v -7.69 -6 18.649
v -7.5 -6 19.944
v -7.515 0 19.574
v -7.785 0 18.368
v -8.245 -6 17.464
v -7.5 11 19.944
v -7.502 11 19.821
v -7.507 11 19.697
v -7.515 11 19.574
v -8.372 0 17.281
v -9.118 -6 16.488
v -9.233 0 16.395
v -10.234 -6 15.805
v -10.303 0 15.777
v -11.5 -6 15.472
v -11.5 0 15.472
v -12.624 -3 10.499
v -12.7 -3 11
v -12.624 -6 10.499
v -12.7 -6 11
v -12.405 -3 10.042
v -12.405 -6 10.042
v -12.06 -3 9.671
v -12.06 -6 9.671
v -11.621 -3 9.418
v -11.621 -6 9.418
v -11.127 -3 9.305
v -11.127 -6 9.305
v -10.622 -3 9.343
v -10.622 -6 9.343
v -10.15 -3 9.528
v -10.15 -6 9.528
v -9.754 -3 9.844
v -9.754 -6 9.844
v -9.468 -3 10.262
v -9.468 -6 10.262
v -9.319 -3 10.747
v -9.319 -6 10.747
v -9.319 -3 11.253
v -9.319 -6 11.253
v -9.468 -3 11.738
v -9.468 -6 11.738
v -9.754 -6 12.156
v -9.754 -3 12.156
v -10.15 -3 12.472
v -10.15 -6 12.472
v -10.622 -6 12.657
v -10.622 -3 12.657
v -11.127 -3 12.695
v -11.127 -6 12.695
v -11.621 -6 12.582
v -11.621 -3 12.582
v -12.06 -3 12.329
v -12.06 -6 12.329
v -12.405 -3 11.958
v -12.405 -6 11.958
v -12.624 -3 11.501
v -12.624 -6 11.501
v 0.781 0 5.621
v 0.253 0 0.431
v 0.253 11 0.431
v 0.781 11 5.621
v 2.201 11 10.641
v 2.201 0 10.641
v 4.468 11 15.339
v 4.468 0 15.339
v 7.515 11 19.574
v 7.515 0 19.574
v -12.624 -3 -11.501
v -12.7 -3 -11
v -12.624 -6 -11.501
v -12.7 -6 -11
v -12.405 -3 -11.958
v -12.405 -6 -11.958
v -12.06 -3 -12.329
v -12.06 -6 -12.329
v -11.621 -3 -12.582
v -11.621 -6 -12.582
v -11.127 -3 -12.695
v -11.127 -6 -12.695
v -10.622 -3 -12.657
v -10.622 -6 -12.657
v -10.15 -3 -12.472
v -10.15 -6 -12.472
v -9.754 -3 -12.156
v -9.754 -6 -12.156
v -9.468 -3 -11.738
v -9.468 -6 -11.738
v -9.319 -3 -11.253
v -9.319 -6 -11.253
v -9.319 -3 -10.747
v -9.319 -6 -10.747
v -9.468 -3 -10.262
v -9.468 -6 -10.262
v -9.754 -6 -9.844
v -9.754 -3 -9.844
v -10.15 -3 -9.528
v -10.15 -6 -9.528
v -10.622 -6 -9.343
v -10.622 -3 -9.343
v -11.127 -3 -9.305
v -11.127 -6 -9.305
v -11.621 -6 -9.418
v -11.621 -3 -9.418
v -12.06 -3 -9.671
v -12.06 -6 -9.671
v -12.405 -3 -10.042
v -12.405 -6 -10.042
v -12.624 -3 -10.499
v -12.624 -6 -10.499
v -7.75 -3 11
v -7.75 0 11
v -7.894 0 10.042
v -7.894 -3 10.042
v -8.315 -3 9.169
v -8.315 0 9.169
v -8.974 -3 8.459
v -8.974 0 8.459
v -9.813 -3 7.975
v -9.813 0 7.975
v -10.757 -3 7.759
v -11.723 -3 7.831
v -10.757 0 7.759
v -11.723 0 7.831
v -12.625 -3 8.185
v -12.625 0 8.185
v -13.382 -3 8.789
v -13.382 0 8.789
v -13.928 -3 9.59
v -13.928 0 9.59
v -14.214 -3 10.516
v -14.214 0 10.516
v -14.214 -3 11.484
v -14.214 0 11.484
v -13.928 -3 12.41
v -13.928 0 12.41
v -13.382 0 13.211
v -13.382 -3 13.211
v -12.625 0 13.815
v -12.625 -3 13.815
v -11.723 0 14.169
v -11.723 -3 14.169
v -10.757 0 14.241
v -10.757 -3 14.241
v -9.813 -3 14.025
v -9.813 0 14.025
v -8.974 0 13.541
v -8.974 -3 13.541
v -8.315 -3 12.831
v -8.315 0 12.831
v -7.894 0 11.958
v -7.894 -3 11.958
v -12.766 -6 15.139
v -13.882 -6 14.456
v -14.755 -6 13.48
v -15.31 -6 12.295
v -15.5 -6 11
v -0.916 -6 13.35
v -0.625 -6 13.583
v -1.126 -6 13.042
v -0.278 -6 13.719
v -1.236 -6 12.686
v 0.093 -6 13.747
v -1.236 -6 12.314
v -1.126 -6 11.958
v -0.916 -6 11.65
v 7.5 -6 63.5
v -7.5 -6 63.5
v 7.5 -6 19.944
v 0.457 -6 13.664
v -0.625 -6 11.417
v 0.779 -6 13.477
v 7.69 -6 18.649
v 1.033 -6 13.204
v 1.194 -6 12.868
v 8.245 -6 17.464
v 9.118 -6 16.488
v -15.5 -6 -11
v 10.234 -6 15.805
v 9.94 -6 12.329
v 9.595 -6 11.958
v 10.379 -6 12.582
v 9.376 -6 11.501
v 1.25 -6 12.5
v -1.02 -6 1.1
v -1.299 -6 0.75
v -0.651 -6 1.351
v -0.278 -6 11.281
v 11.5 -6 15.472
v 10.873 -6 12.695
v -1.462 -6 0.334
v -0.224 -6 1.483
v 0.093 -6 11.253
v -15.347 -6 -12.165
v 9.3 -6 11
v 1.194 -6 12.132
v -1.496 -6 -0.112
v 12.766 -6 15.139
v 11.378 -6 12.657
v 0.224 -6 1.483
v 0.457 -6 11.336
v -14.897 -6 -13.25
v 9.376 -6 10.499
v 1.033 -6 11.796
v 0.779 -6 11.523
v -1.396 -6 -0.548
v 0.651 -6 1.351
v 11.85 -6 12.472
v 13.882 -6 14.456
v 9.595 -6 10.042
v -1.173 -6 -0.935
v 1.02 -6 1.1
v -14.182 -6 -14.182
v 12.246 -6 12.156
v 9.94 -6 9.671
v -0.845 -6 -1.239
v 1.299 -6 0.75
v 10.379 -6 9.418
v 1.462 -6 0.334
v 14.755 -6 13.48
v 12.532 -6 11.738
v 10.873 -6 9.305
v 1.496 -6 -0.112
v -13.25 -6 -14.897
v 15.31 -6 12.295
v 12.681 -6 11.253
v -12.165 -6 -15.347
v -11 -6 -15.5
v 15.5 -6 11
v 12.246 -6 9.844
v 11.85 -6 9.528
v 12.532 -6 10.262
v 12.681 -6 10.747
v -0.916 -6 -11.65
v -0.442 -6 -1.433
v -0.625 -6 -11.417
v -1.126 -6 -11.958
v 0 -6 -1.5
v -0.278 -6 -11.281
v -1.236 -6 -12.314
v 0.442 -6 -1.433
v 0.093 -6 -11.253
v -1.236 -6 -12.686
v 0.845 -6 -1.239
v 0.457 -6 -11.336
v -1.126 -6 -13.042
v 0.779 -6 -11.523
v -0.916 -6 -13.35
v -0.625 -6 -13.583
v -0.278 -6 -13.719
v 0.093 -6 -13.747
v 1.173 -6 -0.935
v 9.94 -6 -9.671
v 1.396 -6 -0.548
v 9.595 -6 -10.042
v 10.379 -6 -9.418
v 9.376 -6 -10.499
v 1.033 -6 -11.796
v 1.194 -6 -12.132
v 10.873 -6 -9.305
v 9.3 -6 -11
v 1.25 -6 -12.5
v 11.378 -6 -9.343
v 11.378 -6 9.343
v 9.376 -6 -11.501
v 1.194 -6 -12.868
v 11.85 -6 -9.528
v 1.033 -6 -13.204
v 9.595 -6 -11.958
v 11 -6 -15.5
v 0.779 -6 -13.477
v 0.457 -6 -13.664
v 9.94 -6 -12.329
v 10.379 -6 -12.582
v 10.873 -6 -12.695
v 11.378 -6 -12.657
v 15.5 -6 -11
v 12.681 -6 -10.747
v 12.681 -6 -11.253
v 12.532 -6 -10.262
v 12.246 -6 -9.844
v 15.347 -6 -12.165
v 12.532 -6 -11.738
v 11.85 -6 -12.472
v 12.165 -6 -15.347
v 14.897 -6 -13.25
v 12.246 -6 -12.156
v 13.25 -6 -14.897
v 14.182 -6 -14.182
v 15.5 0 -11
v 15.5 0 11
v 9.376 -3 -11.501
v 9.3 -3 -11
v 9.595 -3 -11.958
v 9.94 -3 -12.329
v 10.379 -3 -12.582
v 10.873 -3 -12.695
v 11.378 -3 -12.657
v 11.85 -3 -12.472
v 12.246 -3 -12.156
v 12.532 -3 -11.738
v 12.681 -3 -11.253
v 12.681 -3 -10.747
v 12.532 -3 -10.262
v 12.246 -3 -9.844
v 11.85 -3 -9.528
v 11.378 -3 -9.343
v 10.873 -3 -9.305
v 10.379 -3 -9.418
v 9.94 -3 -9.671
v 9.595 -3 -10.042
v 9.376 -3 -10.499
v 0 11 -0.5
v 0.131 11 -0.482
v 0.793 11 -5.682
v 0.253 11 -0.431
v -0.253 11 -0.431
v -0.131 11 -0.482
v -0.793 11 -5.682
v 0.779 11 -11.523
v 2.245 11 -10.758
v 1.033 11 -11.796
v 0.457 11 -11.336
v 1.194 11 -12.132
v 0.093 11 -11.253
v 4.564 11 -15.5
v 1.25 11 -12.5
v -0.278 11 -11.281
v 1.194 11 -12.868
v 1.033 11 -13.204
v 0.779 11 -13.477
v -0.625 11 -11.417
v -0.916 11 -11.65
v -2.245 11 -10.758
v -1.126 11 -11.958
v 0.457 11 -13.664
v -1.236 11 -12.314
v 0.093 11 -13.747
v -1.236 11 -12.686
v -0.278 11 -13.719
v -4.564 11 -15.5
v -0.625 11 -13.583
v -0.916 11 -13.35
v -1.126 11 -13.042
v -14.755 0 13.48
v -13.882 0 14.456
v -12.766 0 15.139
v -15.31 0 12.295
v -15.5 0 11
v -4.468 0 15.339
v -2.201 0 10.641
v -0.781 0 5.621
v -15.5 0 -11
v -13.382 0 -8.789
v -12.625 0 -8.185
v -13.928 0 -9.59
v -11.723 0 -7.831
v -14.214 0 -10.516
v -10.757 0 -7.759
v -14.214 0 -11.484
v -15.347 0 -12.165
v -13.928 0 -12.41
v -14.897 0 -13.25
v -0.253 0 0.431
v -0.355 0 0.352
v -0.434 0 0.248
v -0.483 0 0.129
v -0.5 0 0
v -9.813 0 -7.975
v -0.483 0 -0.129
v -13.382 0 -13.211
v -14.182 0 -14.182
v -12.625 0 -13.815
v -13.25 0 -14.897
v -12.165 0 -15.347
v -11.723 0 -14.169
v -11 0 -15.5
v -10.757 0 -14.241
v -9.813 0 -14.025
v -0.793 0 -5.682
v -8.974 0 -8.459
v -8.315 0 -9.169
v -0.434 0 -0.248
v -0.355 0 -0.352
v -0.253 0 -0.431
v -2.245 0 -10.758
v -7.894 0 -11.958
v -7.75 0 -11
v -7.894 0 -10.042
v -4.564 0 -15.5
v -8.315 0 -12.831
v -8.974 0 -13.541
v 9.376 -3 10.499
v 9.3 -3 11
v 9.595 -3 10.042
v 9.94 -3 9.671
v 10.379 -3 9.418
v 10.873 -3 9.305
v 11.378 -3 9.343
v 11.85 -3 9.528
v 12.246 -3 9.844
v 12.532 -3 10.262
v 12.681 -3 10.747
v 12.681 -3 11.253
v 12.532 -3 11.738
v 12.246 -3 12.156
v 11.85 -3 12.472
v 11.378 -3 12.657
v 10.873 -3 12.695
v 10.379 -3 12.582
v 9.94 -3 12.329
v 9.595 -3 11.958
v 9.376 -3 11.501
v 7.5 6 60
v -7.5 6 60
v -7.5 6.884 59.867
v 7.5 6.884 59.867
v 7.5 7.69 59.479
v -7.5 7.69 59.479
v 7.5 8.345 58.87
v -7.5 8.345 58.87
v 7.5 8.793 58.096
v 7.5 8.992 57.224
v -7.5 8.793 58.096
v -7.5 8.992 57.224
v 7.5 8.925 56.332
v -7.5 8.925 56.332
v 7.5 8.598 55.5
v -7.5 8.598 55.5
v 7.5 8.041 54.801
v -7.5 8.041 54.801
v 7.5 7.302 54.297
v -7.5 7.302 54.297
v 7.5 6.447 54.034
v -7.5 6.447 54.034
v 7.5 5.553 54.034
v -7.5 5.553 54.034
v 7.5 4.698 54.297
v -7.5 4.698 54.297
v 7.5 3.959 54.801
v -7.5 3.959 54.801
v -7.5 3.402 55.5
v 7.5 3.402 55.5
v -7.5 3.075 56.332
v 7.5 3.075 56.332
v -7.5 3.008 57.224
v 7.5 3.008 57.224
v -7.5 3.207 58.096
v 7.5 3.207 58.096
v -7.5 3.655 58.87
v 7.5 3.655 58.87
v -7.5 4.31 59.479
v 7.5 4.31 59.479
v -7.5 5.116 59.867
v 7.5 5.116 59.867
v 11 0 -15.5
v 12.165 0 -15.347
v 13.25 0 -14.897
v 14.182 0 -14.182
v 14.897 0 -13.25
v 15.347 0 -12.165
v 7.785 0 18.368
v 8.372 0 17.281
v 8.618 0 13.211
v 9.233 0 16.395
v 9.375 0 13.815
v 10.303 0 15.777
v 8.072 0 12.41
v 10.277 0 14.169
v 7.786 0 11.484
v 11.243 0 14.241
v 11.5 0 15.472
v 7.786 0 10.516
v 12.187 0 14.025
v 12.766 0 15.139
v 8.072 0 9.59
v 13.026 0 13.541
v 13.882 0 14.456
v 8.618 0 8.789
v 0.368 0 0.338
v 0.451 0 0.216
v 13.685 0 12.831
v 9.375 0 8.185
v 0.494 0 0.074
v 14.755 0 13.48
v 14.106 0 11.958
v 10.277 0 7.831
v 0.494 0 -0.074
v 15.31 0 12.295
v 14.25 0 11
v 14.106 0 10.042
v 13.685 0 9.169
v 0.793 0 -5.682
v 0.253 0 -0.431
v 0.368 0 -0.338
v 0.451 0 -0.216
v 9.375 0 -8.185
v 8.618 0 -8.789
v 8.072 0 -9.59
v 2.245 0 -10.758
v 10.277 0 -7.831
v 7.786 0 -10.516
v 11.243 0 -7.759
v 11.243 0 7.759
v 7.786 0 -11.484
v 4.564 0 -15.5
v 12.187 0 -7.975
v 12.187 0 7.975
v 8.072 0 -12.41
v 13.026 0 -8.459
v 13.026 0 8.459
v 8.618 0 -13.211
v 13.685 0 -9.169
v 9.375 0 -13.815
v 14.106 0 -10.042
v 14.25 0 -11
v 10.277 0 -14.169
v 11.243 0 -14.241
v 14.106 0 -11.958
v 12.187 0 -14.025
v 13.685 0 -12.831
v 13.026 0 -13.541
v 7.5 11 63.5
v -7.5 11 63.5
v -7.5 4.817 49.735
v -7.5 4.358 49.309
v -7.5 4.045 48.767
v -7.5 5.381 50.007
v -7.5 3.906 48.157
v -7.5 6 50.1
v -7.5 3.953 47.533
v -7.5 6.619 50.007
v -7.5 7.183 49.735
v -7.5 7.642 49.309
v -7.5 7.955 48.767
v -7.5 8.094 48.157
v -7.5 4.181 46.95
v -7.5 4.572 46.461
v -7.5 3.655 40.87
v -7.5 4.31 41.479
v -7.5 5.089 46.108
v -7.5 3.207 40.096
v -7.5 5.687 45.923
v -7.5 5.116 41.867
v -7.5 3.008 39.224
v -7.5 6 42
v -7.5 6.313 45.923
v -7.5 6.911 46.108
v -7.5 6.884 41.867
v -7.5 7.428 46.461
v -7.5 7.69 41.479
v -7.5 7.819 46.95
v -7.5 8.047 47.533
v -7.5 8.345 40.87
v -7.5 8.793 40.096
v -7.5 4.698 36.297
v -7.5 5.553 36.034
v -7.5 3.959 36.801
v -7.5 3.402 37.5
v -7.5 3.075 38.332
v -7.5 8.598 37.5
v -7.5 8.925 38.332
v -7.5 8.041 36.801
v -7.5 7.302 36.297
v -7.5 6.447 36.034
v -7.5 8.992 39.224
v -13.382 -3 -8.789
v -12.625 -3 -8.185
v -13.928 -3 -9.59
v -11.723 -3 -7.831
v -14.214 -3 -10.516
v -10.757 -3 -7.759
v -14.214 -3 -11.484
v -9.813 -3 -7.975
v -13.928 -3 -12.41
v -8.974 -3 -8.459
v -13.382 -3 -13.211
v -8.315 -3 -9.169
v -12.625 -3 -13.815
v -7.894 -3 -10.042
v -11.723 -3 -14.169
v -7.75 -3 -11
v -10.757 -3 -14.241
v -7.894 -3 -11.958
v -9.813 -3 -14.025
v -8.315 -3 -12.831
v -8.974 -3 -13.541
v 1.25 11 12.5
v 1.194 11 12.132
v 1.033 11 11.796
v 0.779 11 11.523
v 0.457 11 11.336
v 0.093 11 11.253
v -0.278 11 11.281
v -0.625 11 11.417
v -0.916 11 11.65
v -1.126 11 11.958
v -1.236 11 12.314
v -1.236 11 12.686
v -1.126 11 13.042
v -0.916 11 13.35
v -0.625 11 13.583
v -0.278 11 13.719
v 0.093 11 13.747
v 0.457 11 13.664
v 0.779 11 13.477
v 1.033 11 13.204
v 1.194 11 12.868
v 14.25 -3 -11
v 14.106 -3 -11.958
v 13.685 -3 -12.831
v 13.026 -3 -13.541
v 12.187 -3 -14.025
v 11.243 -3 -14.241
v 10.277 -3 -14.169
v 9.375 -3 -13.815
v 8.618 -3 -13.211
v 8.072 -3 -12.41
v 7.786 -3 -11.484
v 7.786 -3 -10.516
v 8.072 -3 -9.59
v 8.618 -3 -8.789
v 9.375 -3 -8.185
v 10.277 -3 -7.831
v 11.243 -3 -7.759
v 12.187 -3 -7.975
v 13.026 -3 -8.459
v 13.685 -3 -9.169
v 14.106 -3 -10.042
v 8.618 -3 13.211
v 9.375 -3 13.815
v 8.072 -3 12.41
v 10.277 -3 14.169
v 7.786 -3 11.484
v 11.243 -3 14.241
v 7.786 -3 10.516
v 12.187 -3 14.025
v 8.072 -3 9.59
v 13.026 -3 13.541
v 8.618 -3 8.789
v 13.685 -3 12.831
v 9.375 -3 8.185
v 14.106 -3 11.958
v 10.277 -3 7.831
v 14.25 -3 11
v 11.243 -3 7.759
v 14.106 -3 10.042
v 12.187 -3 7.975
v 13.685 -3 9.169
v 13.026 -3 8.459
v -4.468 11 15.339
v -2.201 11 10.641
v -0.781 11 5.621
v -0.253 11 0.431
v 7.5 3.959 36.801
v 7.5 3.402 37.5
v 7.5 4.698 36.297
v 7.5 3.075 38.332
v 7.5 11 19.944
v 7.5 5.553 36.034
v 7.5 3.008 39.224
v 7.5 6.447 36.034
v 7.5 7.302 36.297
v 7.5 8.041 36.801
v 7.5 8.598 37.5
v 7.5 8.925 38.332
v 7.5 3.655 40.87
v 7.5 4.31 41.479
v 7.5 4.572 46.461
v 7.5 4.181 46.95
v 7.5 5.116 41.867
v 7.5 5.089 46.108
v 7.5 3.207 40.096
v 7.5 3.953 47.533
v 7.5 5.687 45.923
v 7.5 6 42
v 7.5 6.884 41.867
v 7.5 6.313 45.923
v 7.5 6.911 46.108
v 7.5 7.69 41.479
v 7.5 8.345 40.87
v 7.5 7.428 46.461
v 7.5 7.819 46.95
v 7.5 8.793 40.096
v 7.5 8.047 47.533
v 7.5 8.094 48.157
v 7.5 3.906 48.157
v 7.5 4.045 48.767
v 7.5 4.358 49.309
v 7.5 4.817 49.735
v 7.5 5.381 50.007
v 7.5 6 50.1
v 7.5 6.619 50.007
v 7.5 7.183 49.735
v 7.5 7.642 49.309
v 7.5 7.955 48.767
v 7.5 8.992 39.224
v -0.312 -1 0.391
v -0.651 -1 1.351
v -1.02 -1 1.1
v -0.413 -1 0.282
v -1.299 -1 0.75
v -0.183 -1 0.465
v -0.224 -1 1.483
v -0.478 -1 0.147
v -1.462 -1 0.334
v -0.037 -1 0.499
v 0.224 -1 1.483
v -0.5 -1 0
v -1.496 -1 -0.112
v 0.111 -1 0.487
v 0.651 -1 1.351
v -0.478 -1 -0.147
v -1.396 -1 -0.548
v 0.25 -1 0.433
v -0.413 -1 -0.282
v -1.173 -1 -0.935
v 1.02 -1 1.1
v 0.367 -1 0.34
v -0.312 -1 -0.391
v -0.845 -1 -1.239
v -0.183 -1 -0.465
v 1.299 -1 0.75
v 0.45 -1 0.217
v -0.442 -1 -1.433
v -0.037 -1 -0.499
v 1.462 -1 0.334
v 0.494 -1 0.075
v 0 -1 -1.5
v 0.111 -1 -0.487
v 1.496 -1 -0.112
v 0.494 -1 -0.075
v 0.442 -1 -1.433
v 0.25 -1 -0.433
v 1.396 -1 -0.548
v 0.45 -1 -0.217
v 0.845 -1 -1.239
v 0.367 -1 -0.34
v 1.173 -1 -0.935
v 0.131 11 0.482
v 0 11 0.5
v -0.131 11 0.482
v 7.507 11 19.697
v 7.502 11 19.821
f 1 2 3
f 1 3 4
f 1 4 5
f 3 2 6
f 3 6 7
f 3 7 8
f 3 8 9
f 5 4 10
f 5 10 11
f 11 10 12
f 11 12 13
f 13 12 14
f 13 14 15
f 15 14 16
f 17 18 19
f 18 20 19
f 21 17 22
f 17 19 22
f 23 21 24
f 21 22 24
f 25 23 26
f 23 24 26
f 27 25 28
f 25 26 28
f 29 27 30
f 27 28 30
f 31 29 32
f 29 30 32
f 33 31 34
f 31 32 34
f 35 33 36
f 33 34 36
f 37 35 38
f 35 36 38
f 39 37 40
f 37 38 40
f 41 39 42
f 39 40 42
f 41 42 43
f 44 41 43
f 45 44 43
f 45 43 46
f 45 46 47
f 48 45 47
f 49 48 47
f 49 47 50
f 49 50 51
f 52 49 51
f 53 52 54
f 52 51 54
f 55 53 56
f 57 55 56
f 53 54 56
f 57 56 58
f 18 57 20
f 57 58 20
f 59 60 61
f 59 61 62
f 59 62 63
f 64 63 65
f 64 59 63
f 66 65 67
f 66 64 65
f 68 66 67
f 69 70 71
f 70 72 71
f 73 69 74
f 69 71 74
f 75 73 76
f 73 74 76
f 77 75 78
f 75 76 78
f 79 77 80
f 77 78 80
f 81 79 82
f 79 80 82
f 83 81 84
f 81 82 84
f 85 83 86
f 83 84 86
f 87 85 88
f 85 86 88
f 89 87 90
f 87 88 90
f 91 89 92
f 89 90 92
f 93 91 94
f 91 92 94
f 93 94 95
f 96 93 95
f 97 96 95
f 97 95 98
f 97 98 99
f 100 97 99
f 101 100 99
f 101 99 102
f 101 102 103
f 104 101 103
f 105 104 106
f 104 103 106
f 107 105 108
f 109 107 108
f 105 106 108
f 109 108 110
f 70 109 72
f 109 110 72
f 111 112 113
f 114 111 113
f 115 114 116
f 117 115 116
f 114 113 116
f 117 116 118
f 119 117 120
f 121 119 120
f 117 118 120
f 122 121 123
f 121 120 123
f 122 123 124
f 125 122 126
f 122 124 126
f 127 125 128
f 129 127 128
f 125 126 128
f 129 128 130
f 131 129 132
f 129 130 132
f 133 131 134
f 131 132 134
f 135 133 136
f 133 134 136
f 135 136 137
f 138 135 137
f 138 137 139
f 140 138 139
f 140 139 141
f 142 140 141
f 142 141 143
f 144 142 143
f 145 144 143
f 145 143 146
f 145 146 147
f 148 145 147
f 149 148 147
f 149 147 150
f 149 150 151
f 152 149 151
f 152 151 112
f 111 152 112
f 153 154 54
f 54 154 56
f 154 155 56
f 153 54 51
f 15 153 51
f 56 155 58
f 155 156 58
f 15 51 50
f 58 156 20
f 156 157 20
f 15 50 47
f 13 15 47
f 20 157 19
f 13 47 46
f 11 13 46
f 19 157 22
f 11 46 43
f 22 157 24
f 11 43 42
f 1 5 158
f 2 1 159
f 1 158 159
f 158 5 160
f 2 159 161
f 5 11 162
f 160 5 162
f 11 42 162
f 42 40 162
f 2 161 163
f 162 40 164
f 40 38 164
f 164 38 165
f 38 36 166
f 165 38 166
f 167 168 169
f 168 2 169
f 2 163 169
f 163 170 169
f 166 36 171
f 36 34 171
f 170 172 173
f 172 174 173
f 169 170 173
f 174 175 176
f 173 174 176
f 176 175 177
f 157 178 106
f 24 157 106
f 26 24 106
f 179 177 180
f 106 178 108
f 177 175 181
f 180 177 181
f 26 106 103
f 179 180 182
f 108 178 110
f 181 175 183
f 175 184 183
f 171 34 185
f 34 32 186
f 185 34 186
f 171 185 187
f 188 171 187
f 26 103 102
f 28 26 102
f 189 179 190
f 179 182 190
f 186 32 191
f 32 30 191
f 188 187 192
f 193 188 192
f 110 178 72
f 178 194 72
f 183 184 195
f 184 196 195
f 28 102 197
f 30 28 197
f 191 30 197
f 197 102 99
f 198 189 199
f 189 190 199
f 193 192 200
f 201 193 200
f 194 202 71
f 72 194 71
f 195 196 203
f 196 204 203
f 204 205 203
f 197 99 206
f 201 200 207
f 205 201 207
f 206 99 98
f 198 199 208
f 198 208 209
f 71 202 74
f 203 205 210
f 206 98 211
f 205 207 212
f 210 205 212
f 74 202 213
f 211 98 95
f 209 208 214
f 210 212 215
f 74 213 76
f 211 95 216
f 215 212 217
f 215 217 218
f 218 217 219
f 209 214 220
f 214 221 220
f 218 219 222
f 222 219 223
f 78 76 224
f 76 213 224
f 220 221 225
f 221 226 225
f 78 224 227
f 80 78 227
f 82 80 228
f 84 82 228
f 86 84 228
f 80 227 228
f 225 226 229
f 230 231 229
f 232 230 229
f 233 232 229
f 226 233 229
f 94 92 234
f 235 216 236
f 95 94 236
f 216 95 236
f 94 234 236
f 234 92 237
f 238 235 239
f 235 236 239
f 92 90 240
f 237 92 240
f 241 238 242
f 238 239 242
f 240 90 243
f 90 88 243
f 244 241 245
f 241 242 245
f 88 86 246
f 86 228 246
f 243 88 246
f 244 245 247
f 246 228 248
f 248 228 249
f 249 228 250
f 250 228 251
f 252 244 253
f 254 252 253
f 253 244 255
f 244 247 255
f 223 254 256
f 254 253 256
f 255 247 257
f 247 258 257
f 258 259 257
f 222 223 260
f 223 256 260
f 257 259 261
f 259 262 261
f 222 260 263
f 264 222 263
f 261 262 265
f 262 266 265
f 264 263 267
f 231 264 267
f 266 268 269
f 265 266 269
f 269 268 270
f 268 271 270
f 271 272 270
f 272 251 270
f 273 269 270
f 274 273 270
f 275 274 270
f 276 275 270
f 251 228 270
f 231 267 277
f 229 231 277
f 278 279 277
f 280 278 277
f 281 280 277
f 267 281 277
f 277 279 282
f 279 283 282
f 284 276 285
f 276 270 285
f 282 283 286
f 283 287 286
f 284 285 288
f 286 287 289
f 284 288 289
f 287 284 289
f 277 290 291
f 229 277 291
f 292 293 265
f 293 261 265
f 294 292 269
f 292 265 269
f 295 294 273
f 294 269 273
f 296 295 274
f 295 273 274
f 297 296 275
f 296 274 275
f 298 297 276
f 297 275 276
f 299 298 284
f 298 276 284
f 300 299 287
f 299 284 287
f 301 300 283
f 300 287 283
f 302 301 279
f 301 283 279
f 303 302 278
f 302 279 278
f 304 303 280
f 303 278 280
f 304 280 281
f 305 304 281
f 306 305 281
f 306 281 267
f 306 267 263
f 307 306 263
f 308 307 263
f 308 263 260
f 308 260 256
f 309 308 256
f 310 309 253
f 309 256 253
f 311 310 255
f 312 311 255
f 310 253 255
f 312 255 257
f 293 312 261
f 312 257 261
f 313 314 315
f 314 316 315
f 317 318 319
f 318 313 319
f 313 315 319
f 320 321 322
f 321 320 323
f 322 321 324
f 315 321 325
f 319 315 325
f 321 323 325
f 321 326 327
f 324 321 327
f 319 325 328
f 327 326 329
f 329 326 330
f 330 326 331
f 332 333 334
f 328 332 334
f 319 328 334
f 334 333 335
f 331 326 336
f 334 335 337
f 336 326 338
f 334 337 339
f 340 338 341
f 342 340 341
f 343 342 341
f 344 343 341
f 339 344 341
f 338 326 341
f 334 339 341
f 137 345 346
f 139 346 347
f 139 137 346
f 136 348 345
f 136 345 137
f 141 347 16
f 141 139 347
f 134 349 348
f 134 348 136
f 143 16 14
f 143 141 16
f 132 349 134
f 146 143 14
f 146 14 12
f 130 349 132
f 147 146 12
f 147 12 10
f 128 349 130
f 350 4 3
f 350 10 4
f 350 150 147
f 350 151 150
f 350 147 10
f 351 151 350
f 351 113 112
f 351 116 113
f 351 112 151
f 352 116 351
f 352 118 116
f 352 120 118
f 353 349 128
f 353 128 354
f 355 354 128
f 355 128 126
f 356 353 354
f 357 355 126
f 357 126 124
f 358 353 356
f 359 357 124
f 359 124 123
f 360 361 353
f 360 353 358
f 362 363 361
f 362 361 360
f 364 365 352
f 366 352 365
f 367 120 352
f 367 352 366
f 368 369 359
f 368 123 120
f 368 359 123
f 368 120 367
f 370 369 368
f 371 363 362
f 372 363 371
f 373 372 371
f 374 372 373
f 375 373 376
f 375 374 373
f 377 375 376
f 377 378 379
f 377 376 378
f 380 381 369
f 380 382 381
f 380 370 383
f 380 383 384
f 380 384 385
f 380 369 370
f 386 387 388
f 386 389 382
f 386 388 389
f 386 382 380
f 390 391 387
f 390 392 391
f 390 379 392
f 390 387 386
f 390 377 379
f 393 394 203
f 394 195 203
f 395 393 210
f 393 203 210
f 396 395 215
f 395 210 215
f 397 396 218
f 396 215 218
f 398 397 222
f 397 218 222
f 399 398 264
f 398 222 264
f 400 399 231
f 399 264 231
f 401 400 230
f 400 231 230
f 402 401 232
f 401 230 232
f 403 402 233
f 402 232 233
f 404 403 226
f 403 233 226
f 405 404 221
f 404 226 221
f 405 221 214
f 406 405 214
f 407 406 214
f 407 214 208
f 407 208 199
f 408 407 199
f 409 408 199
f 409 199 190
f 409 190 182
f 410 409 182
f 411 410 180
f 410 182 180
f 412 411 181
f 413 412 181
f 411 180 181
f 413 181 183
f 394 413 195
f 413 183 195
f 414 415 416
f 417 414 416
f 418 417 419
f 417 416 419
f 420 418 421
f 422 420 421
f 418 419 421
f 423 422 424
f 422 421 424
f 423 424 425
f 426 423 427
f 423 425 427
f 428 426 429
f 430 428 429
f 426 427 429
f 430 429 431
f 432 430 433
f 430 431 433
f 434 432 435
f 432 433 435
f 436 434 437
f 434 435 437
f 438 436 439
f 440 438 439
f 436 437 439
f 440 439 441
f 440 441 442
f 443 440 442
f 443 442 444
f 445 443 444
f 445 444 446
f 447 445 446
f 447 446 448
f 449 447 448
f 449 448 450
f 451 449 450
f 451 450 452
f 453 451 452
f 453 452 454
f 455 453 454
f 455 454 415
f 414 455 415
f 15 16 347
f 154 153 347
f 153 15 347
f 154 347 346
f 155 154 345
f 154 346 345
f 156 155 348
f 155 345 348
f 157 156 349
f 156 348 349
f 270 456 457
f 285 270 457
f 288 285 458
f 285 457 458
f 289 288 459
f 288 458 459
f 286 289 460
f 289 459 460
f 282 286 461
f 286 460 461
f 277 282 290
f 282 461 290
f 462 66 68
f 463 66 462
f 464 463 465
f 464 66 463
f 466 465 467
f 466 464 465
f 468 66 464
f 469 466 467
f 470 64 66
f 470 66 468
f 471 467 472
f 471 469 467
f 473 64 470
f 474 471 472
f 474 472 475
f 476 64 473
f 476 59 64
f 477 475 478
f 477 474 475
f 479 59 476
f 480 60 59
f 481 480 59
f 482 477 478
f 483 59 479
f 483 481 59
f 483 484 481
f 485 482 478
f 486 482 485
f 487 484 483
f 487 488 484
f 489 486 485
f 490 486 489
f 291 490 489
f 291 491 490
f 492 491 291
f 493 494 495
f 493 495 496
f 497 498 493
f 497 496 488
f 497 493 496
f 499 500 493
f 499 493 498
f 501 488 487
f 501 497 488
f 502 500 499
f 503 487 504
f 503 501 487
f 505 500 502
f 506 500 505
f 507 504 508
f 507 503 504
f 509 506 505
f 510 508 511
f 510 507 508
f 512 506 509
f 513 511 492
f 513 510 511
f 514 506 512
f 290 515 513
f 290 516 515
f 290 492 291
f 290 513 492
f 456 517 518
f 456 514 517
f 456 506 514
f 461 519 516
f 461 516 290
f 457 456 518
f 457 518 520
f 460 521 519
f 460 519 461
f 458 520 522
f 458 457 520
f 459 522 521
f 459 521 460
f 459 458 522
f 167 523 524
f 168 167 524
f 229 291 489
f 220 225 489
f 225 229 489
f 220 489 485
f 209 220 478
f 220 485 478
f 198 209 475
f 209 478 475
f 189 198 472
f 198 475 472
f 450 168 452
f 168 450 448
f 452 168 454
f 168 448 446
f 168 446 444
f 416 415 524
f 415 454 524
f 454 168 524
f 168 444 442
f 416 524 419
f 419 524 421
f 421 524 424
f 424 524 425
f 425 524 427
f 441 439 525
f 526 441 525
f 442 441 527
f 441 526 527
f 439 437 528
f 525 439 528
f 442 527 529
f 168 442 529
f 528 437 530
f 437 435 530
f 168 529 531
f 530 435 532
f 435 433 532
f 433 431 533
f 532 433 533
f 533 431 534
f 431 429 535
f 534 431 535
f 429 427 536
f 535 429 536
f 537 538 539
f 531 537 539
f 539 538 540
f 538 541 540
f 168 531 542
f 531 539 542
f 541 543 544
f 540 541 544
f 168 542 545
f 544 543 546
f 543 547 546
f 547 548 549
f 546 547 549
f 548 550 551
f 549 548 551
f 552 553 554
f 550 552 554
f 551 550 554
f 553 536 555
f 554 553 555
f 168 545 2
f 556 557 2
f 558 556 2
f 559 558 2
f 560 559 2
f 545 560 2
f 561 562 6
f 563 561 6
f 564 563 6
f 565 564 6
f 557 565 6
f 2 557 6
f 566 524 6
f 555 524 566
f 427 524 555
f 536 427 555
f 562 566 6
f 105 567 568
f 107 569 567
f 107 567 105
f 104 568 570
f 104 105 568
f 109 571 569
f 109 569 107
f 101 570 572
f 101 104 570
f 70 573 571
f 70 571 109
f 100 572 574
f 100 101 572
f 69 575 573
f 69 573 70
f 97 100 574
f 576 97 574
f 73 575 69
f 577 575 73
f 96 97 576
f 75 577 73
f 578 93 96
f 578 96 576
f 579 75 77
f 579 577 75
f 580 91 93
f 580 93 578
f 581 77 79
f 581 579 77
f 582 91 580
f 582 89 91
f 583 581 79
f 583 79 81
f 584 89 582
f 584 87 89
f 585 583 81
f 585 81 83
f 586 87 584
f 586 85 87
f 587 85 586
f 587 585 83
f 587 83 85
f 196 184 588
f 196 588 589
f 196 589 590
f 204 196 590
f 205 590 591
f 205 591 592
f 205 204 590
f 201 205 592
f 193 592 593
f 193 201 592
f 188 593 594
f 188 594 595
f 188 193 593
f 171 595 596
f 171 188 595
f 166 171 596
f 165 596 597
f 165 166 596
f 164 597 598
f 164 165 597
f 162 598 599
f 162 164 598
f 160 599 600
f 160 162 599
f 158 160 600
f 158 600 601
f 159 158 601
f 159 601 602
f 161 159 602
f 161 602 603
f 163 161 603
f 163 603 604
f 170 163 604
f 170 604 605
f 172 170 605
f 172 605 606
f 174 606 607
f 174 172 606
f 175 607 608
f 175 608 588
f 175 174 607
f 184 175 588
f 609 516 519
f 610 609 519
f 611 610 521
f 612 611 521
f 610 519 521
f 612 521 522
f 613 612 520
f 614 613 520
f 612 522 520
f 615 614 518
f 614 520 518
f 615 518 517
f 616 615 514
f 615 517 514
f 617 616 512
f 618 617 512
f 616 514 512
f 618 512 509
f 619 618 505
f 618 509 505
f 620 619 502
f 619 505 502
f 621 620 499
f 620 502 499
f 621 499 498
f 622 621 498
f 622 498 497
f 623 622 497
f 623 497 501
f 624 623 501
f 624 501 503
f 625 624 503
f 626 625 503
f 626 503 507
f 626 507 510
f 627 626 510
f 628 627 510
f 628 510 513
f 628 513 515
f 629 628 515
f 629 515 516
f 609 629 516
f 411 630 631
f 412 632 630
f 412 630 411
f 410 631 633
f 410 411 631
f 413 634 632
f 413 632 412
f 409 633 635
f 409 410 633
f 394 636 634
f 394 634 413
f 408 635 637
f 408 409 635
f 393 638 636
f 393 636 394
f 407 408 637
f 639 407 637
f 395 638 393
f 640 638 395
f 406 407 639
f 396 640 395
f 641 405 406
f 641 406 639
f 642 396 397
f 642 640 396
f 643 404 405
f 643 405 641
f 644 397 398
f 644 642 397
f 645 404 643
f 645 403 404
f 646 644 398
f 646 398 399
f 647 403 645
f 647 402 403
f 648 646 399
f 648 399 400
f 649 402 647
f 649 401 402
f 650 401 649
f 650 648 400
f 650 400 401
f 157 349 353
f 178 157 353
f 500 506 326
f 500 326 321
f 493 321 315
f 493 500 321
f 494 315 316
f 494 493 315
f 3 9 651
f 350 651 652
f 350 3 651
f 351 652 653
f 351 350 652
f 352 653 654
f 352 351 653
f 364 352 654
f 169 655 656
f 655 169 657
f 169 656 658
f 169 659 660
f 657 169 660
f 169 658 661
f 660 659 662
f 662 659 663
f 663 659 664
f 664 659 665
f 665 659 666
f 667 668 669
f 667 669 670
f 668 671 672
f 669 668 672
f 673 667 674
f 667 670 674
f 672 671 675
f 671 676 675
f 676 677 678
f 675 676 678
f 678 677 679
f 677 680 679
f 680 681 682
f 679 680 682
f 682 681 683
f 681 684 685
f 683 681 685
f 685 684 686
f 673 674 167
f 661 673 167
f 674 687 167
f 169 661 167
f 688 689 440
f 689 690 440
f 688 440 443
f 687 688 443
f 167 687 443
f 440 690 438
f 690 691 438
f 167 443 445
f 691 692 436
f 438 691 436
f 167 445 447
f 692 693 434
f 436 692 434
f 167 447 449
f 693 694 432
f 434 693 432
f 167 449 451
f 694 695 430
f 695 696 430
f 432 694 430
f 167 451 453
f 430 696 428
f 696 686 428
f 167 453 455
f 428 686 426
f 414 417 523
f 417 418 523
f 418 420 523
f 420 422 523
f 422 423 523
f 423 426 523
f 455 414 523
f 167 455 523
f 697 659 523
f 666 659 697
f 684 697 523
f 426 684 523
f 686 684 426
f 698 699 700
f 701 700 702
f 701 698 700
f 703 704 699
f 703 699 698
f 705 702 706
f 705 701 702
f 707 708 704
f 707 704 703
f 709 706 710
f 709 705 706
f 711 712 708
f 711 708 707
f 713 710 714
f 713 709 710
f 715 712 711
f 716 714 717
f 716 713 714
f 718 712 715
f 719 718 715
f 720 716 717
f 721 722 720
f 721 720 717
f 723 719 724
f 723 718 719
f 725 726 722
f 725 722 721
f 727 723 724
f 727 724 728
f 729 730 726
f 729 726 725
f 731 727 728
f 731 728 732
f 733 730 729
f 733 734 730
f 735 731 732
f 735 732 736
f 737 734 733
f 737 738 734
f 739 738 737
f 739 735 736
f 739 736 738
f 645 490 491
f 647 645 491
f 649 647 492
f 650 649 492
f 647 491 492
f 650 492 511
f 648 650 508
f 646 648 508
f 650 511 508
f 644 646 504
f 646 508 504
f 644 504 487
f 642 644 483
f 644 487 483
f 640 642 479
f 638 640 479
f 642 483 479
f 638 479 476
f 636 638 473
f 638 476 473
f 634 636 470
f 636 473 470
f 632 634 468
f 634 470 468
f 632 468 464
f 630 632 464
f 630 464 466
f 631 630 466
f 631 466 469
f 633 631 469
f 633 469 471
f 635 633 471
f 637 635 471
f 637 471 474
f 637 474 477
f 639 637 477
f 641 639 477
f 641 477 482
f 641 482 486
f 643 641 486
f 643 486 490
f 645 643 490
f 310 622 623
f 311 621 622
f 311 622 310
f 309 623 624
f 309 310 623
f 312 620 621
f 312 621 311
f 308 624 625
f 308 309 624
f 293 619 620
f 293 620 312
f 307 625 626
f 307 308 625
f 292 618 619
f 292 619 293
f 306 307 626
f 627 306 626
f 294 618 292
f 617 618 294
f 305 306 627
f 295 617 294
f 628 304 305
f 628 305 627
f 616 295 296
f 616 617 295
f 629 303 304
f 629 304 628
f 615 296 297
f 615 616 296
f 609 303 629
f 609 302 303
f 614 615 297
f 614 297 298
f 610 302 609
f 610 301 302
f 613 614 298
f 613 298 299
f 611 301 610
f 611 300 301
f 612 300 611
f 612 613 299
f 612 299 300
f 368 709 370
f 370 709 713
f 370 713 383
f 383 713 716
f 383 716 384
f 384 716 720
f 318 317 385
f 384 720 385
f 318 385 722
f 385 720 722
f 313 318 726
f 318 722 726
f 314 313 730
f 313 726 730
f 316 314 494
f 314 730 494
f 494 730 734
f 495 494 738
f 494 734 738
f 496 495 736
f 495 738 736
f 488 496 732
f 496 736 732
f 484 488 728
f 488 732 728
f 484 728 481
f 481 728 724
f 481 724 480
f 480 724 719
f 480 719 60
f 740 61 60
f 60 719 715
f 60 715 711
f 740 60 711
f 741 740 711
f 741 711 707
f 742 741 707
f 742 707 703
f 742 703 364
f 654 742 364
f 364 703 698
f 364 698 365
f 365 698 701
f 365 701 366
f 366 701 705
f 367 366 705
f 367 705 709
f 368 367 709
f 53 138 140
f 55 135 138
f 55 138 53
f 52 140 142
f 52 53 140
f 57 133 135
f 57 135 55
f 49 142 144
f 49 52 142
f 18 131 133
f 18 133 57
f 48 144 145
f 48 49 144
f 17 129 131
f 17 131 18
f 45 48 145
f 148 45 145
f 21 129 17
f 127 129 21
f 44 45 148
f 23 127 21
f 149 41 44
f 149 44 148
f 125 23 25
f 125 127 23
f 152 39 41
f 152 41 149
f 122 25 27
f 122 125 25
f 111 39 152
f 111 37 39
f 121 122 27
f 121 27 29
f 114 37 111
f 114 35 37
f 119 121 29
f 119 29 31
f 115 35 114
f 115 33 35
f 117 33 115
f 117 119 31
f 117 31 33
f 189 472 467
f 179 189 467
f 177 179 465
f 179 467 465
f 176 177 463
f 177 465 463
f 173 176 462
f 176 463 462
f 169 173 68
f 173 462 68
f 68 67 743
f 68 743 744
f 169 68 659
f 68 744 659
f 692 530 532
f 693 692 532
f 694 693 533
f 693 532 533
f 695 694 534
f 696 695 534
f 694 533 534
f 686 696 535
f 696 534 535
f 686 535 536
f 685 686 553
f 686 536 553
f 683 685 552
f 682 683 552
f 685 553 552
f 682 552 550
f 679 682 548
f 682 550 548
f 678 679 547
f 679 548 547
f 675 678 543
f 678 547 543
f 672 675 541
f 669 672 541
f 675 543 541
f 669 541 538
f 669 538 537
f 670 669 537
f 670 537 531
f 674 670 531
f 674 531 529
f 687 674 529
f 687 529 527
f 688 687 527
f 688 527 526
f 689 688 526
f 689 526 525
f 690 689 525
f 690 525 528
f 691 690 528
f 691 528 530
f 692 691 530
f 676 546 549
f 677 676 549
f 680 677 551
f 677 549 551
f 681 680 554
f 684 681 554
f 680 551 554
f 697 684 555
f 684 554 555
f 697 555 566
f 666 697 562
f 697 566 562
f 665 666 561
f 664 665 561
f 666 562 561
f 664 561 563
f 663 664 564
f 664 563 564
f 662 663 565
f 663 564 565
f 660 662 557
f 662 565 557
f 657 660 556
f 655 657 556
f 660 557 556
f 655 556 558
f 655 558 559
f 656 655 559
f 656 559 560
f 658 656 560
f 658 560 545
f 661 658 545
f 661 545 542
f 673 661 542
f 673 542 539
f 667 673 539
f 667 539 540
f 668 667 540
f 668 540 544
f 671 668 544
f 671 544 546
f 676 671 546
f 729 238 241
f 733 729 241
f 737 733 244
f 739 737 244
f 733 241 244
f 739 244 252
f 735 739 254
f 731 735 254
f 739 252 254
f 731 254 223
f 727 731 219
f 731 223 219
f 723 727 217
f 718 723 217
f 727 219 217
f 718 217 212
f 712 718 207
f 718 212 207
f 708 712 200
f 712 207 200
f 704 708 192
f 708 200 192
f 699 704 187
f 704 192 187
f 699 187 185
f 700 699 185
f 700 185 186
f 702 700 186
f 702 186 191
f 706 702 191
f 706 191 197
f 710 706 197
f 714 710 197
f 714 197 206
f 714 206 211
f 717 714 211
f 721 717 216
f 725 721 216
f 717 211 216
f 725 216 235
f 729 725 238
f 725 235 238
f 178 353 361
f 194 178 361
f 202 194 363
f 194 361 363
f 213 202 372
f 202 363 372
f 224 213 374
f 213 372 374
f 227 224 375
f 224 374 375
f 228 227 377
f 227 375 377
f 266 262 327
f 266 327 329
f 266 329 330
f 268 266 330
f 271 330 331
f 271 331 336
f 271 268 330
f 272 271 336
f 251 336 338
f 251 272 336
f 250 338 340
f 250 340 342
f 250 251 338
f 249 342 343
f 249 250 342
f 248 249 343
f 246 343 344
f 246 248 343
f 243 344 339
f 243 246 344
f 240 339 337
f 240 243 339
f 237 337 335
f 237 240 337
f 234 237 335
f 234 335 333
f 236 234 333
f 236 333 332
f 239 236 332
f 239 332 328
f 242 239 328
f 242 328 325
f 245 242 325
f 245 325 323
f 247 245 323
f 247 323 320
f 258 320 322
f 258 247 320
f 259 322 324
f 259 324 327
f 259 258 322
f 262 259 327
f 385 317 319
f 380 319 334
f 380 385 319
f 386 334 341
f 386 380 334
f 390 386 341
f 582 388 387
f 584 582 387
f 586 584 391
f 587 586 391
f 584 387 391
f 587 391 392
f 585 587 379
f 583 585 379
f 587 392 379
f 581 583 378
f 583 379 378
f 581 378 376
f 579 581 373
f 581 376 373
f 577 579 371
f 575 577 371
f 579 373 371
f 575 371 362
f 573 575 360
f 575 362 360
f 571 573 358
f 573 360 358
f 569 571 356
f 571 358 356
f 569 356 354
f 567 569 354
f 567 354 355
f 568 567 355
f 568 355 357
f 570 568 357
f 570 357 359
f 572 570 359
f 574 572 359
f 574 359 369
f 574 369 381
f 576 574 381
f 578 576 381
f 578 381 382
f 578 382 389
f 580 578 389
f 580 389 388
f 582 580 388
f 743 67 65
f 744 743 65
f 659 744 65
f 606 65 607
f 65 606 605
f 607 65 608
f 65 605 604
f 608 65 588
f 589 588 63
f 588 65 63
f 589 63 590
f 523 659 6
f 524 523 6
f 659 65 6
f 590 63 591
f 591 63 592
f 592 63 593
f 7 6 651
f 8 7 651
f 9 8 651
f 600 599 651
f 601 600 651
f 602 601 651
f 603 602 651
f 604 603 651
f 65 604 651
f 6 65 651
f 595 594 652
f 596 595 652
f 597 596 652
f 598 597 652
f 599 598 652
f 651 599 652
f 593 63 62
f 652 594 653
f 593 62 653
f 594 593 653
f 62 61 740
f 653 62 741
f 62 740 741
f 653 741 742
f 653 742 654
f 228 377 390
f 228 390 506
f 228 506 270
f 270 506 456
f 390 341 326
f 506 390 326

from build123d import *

# Parameters (mm, degrees)
SKETCH1_W                      = 32.5
SKETCH1_H                      = 80.25
BOSS_EXTRUDE1_DEPTH            = 6
BOSS_EXTRUDE2_DEPTH            = 11
F_6_0MM_DOWEL_HOLE1_D          = 6
M5X0_8_TAPPED_HOLE1_D          = 4.2
CBORE_FOR_M3_SHCS1_D           = 3.4
CBORE_FOR_M3_SHCS1_CBORE_D     = 6.5
CBORE_FOR_M3_SHCS1_CBORE_DEPTH = 3
F_1_0_1_DIAMETER_HOLE1_D       = 1
SKETCH12_R                     = 1.5
CUT_EXTRUDE1_DEPTH             = 5
SKETCH13_W                     = 6
SKETCH13_H                     = 35
CUT_EXTRUDE2_DEPTH             = 69.184034055
FILLET1_R                      = 2.38125
SKETCH14_W                     = 34.5
SKETCH14_H                     = 82.25
CUT_EXTRUDE3_DEPTH             = 69.184034055
M3X0_5_START                   = -6
M3X0_5_TAPPED_HOLE1_OUTLINE_R  = 1.25
M3X0_5_TAPPED_HOLE1_DEPTH      = 17


# Read off the part's stored shape, not the designer's step: M3x0.5 Tapped Hole1
with BuildPart() as part:
    # Sketch1 → Boss-Extrude1 (new body)
    with BuildSketch(Plane(origin=(0, 0, 0), x_dir=(1, 0, 0), z_dir=(0, 1, 0))):
        with Locations((0, -23.875)):
            Rectangle(SKETCH1_W, SKETCH1_H)
    extrude(amount=-BOSS_EXTRUDE1_DEPTH)

    # Sketch2 → Boss-Extrude2 (add)
    with BuildSketch(Plane(origin=(0, 0, 0), x_dir=(1, 0, 0), z_dir=(0, 1, 0))):
        with BuildLine():
            Line((-5.032198748, 16.25), (5.032198748, 16.25))
            ThreePointArc((5.032198748, 16.25), (1.230950737, -7.608861929), (16.25, -26.532998323))
            Line((16.25, -26.532998323), (16.25, -64))
            Line((16.25, -64), (-16.25, -64))
            Line((-16.25, -64), (-16.25, -26.532998323))
            ThreePointArc((-16.25, -26.532998323), (-1.230950737, -7.608861929), (-5.032198748, 16.25))
        make_face()
    extrude(amount=BOSS_EXTRUDE2_DEPTH)

    # Ø6.0mm Dowel Hole1 (through all)
    with Locations(Plane(origin=(16.25, 0, 0), x_dir=(0, 0, -1), z_dir=(1, 0, 0))):
        with Locations((-57, 6), (-39, 6)):
            Hole(F_6_0MM_DOWEL_HOLE1_D / 2)

    # M5x0.8 Tapped Hole1 (through all)
    with Locations(Plane(origin=(16.25, 0, 0), x_dir=(0, 0, -1), z_dir=(1, 0, 0))):
        with Locations((-48, 6)):
            Hole(M5X0_8_TAPPED_HOLE1_D / 2)

    # CBORE for M3 SHCS1 (through all)
    with Locations(Plane(origin=(0, 0, 0), x_dir=(1, 0, 0), z_dir=(0, 1, 0))):
        with Locations((-11, 11), (11, 11), (11, -11), (-11, -11)):
            CounterBoreHole(CBORE_FOR_M3_SHCS1_D / 2, CBORE_FOR_M3_SHCS1_CBORE_D / 2, CBORE_FOR_M3_SHCS1_CBORE_DEPTH)

    # Ø1.0 (1) Diameter Hole1 (through all)
    with Locations(Plane(origin=(0, 11, 0), x_dir=(1, 0, 0), z_dir=(0, 1, 0))):
        with Locations((0, 0)):
            Hole(F_1_0_1_DIAMETER_HOLE1_D / 2)

    # Sketch12 → Cut-Extrude1 (cut)
    with BuildSketch(Plane.XZ.offset(6)):
        with Locations(Location((0, 0, 0), (0, 0, 270))):
            Circle(SKETCH12_R)
    extrude(amount=-CUT_EXTRUDE1_DEPTH, mode=Mode.SUBTRACT)

    # Sketch13 → Cut-Extrude2 (cut, through all)
    with BuildSketch(Plane(origin=(0, 11, 0), x_dir=(1, 0, 0), z_dir=(0, 1, 0))):
        with Locations((-13.25, -46.5)):
            Rectangle(SKETCH13_W, SKETCH13_H)
        with Locations((13.25, -46.5)):
            Rectangle(SKETCH13_W, SKETCH13_H)
    extrude(amount=-CUT_EXTRUDE2_DEPTH, mode=Mode.SUBTRACT)

    # Fillet1
    fillet1_edges = [part.edges().sort_by_distance(p)[0] for p in [
        (-10.25, 2.5, 29),
        (10.25, 2.5, 29),
    ]]
    fillet(fillet1_edges, radius=FILLET1_R)

    # Sketch14 → Cut-Extrude3 (cut, through all)
    with BuildSketch(Plane(origin=(0, 11, 0), x_dir=(1, 0, 0), z_dir=(0, 1, 0))):
        with Locations((0, -23.875)):
            Rectangle(SKETCH14_W, SKETCH14_H)
        with BuildLine():
            Line((-7.5, -63.5), (-7.5, -19.94427191))
            ThreePointArc((-7.5, -19.94427191), (-8.645898034, -16.94427191), (-11.5, -15.472135955))
            ThreePointArc((-11.5, -15.472135955), (-14.354101966, -14), (-15.5, -11))
            Line((-15.5, -11), (-15.5, 11))
            ThreePointArc((-15.5, 11), (-14.181980515, 14.181980515), (-11, 15.5))
            Line((-11, 15.5), (11, 15.5))
            ThreePointArc((11, 15.5), (14.181980515, 14.181980515), (15.5, 11))
            Line((15.5, 11), (15.5, -11))
            ThreePointArc((15.5, -11), (14.354101966, -14), (11.5, -15.472135955))
            ThreePointArc((11.5, -15.472135955), (8.645898034, -16.94427191), (7.5, -19.94427191))
            Line((7.5, -19.94427191), (7.5, -63.5))
            Line((7.5, -63.5), (-7.5, -63.5))
        make_face(mode=Mode.SUBTRACT)
    extrude(amount=-CUT_EXTRUDE3_DEPTH, mode=Mode.SUBTRACT)

    # M3x0.5 Tapped Hole1 outline → M3x0.5 Tapped Hole1 (cut)
    with BuildSketch(Plane(origin=(0, 0, 0), x_dir=(1, 0, 0), z_dir=(0, 1, 0)).offset(M3X0_5_START)):
        with Locations((0, -12.5)):
            Circle(M3X0_5_TAPPED_HOLE1_OUTLINE_R)
        with Locations((0, 12.5)):
            Circle(M3X0_5_TAPPED_HOLE1_OUTLINE_R)
    extrude(amount=M3X0_5_TAPPED_HOLE1_DEPTH, mode=Mode.SUBTRACT)


solid = part.part
